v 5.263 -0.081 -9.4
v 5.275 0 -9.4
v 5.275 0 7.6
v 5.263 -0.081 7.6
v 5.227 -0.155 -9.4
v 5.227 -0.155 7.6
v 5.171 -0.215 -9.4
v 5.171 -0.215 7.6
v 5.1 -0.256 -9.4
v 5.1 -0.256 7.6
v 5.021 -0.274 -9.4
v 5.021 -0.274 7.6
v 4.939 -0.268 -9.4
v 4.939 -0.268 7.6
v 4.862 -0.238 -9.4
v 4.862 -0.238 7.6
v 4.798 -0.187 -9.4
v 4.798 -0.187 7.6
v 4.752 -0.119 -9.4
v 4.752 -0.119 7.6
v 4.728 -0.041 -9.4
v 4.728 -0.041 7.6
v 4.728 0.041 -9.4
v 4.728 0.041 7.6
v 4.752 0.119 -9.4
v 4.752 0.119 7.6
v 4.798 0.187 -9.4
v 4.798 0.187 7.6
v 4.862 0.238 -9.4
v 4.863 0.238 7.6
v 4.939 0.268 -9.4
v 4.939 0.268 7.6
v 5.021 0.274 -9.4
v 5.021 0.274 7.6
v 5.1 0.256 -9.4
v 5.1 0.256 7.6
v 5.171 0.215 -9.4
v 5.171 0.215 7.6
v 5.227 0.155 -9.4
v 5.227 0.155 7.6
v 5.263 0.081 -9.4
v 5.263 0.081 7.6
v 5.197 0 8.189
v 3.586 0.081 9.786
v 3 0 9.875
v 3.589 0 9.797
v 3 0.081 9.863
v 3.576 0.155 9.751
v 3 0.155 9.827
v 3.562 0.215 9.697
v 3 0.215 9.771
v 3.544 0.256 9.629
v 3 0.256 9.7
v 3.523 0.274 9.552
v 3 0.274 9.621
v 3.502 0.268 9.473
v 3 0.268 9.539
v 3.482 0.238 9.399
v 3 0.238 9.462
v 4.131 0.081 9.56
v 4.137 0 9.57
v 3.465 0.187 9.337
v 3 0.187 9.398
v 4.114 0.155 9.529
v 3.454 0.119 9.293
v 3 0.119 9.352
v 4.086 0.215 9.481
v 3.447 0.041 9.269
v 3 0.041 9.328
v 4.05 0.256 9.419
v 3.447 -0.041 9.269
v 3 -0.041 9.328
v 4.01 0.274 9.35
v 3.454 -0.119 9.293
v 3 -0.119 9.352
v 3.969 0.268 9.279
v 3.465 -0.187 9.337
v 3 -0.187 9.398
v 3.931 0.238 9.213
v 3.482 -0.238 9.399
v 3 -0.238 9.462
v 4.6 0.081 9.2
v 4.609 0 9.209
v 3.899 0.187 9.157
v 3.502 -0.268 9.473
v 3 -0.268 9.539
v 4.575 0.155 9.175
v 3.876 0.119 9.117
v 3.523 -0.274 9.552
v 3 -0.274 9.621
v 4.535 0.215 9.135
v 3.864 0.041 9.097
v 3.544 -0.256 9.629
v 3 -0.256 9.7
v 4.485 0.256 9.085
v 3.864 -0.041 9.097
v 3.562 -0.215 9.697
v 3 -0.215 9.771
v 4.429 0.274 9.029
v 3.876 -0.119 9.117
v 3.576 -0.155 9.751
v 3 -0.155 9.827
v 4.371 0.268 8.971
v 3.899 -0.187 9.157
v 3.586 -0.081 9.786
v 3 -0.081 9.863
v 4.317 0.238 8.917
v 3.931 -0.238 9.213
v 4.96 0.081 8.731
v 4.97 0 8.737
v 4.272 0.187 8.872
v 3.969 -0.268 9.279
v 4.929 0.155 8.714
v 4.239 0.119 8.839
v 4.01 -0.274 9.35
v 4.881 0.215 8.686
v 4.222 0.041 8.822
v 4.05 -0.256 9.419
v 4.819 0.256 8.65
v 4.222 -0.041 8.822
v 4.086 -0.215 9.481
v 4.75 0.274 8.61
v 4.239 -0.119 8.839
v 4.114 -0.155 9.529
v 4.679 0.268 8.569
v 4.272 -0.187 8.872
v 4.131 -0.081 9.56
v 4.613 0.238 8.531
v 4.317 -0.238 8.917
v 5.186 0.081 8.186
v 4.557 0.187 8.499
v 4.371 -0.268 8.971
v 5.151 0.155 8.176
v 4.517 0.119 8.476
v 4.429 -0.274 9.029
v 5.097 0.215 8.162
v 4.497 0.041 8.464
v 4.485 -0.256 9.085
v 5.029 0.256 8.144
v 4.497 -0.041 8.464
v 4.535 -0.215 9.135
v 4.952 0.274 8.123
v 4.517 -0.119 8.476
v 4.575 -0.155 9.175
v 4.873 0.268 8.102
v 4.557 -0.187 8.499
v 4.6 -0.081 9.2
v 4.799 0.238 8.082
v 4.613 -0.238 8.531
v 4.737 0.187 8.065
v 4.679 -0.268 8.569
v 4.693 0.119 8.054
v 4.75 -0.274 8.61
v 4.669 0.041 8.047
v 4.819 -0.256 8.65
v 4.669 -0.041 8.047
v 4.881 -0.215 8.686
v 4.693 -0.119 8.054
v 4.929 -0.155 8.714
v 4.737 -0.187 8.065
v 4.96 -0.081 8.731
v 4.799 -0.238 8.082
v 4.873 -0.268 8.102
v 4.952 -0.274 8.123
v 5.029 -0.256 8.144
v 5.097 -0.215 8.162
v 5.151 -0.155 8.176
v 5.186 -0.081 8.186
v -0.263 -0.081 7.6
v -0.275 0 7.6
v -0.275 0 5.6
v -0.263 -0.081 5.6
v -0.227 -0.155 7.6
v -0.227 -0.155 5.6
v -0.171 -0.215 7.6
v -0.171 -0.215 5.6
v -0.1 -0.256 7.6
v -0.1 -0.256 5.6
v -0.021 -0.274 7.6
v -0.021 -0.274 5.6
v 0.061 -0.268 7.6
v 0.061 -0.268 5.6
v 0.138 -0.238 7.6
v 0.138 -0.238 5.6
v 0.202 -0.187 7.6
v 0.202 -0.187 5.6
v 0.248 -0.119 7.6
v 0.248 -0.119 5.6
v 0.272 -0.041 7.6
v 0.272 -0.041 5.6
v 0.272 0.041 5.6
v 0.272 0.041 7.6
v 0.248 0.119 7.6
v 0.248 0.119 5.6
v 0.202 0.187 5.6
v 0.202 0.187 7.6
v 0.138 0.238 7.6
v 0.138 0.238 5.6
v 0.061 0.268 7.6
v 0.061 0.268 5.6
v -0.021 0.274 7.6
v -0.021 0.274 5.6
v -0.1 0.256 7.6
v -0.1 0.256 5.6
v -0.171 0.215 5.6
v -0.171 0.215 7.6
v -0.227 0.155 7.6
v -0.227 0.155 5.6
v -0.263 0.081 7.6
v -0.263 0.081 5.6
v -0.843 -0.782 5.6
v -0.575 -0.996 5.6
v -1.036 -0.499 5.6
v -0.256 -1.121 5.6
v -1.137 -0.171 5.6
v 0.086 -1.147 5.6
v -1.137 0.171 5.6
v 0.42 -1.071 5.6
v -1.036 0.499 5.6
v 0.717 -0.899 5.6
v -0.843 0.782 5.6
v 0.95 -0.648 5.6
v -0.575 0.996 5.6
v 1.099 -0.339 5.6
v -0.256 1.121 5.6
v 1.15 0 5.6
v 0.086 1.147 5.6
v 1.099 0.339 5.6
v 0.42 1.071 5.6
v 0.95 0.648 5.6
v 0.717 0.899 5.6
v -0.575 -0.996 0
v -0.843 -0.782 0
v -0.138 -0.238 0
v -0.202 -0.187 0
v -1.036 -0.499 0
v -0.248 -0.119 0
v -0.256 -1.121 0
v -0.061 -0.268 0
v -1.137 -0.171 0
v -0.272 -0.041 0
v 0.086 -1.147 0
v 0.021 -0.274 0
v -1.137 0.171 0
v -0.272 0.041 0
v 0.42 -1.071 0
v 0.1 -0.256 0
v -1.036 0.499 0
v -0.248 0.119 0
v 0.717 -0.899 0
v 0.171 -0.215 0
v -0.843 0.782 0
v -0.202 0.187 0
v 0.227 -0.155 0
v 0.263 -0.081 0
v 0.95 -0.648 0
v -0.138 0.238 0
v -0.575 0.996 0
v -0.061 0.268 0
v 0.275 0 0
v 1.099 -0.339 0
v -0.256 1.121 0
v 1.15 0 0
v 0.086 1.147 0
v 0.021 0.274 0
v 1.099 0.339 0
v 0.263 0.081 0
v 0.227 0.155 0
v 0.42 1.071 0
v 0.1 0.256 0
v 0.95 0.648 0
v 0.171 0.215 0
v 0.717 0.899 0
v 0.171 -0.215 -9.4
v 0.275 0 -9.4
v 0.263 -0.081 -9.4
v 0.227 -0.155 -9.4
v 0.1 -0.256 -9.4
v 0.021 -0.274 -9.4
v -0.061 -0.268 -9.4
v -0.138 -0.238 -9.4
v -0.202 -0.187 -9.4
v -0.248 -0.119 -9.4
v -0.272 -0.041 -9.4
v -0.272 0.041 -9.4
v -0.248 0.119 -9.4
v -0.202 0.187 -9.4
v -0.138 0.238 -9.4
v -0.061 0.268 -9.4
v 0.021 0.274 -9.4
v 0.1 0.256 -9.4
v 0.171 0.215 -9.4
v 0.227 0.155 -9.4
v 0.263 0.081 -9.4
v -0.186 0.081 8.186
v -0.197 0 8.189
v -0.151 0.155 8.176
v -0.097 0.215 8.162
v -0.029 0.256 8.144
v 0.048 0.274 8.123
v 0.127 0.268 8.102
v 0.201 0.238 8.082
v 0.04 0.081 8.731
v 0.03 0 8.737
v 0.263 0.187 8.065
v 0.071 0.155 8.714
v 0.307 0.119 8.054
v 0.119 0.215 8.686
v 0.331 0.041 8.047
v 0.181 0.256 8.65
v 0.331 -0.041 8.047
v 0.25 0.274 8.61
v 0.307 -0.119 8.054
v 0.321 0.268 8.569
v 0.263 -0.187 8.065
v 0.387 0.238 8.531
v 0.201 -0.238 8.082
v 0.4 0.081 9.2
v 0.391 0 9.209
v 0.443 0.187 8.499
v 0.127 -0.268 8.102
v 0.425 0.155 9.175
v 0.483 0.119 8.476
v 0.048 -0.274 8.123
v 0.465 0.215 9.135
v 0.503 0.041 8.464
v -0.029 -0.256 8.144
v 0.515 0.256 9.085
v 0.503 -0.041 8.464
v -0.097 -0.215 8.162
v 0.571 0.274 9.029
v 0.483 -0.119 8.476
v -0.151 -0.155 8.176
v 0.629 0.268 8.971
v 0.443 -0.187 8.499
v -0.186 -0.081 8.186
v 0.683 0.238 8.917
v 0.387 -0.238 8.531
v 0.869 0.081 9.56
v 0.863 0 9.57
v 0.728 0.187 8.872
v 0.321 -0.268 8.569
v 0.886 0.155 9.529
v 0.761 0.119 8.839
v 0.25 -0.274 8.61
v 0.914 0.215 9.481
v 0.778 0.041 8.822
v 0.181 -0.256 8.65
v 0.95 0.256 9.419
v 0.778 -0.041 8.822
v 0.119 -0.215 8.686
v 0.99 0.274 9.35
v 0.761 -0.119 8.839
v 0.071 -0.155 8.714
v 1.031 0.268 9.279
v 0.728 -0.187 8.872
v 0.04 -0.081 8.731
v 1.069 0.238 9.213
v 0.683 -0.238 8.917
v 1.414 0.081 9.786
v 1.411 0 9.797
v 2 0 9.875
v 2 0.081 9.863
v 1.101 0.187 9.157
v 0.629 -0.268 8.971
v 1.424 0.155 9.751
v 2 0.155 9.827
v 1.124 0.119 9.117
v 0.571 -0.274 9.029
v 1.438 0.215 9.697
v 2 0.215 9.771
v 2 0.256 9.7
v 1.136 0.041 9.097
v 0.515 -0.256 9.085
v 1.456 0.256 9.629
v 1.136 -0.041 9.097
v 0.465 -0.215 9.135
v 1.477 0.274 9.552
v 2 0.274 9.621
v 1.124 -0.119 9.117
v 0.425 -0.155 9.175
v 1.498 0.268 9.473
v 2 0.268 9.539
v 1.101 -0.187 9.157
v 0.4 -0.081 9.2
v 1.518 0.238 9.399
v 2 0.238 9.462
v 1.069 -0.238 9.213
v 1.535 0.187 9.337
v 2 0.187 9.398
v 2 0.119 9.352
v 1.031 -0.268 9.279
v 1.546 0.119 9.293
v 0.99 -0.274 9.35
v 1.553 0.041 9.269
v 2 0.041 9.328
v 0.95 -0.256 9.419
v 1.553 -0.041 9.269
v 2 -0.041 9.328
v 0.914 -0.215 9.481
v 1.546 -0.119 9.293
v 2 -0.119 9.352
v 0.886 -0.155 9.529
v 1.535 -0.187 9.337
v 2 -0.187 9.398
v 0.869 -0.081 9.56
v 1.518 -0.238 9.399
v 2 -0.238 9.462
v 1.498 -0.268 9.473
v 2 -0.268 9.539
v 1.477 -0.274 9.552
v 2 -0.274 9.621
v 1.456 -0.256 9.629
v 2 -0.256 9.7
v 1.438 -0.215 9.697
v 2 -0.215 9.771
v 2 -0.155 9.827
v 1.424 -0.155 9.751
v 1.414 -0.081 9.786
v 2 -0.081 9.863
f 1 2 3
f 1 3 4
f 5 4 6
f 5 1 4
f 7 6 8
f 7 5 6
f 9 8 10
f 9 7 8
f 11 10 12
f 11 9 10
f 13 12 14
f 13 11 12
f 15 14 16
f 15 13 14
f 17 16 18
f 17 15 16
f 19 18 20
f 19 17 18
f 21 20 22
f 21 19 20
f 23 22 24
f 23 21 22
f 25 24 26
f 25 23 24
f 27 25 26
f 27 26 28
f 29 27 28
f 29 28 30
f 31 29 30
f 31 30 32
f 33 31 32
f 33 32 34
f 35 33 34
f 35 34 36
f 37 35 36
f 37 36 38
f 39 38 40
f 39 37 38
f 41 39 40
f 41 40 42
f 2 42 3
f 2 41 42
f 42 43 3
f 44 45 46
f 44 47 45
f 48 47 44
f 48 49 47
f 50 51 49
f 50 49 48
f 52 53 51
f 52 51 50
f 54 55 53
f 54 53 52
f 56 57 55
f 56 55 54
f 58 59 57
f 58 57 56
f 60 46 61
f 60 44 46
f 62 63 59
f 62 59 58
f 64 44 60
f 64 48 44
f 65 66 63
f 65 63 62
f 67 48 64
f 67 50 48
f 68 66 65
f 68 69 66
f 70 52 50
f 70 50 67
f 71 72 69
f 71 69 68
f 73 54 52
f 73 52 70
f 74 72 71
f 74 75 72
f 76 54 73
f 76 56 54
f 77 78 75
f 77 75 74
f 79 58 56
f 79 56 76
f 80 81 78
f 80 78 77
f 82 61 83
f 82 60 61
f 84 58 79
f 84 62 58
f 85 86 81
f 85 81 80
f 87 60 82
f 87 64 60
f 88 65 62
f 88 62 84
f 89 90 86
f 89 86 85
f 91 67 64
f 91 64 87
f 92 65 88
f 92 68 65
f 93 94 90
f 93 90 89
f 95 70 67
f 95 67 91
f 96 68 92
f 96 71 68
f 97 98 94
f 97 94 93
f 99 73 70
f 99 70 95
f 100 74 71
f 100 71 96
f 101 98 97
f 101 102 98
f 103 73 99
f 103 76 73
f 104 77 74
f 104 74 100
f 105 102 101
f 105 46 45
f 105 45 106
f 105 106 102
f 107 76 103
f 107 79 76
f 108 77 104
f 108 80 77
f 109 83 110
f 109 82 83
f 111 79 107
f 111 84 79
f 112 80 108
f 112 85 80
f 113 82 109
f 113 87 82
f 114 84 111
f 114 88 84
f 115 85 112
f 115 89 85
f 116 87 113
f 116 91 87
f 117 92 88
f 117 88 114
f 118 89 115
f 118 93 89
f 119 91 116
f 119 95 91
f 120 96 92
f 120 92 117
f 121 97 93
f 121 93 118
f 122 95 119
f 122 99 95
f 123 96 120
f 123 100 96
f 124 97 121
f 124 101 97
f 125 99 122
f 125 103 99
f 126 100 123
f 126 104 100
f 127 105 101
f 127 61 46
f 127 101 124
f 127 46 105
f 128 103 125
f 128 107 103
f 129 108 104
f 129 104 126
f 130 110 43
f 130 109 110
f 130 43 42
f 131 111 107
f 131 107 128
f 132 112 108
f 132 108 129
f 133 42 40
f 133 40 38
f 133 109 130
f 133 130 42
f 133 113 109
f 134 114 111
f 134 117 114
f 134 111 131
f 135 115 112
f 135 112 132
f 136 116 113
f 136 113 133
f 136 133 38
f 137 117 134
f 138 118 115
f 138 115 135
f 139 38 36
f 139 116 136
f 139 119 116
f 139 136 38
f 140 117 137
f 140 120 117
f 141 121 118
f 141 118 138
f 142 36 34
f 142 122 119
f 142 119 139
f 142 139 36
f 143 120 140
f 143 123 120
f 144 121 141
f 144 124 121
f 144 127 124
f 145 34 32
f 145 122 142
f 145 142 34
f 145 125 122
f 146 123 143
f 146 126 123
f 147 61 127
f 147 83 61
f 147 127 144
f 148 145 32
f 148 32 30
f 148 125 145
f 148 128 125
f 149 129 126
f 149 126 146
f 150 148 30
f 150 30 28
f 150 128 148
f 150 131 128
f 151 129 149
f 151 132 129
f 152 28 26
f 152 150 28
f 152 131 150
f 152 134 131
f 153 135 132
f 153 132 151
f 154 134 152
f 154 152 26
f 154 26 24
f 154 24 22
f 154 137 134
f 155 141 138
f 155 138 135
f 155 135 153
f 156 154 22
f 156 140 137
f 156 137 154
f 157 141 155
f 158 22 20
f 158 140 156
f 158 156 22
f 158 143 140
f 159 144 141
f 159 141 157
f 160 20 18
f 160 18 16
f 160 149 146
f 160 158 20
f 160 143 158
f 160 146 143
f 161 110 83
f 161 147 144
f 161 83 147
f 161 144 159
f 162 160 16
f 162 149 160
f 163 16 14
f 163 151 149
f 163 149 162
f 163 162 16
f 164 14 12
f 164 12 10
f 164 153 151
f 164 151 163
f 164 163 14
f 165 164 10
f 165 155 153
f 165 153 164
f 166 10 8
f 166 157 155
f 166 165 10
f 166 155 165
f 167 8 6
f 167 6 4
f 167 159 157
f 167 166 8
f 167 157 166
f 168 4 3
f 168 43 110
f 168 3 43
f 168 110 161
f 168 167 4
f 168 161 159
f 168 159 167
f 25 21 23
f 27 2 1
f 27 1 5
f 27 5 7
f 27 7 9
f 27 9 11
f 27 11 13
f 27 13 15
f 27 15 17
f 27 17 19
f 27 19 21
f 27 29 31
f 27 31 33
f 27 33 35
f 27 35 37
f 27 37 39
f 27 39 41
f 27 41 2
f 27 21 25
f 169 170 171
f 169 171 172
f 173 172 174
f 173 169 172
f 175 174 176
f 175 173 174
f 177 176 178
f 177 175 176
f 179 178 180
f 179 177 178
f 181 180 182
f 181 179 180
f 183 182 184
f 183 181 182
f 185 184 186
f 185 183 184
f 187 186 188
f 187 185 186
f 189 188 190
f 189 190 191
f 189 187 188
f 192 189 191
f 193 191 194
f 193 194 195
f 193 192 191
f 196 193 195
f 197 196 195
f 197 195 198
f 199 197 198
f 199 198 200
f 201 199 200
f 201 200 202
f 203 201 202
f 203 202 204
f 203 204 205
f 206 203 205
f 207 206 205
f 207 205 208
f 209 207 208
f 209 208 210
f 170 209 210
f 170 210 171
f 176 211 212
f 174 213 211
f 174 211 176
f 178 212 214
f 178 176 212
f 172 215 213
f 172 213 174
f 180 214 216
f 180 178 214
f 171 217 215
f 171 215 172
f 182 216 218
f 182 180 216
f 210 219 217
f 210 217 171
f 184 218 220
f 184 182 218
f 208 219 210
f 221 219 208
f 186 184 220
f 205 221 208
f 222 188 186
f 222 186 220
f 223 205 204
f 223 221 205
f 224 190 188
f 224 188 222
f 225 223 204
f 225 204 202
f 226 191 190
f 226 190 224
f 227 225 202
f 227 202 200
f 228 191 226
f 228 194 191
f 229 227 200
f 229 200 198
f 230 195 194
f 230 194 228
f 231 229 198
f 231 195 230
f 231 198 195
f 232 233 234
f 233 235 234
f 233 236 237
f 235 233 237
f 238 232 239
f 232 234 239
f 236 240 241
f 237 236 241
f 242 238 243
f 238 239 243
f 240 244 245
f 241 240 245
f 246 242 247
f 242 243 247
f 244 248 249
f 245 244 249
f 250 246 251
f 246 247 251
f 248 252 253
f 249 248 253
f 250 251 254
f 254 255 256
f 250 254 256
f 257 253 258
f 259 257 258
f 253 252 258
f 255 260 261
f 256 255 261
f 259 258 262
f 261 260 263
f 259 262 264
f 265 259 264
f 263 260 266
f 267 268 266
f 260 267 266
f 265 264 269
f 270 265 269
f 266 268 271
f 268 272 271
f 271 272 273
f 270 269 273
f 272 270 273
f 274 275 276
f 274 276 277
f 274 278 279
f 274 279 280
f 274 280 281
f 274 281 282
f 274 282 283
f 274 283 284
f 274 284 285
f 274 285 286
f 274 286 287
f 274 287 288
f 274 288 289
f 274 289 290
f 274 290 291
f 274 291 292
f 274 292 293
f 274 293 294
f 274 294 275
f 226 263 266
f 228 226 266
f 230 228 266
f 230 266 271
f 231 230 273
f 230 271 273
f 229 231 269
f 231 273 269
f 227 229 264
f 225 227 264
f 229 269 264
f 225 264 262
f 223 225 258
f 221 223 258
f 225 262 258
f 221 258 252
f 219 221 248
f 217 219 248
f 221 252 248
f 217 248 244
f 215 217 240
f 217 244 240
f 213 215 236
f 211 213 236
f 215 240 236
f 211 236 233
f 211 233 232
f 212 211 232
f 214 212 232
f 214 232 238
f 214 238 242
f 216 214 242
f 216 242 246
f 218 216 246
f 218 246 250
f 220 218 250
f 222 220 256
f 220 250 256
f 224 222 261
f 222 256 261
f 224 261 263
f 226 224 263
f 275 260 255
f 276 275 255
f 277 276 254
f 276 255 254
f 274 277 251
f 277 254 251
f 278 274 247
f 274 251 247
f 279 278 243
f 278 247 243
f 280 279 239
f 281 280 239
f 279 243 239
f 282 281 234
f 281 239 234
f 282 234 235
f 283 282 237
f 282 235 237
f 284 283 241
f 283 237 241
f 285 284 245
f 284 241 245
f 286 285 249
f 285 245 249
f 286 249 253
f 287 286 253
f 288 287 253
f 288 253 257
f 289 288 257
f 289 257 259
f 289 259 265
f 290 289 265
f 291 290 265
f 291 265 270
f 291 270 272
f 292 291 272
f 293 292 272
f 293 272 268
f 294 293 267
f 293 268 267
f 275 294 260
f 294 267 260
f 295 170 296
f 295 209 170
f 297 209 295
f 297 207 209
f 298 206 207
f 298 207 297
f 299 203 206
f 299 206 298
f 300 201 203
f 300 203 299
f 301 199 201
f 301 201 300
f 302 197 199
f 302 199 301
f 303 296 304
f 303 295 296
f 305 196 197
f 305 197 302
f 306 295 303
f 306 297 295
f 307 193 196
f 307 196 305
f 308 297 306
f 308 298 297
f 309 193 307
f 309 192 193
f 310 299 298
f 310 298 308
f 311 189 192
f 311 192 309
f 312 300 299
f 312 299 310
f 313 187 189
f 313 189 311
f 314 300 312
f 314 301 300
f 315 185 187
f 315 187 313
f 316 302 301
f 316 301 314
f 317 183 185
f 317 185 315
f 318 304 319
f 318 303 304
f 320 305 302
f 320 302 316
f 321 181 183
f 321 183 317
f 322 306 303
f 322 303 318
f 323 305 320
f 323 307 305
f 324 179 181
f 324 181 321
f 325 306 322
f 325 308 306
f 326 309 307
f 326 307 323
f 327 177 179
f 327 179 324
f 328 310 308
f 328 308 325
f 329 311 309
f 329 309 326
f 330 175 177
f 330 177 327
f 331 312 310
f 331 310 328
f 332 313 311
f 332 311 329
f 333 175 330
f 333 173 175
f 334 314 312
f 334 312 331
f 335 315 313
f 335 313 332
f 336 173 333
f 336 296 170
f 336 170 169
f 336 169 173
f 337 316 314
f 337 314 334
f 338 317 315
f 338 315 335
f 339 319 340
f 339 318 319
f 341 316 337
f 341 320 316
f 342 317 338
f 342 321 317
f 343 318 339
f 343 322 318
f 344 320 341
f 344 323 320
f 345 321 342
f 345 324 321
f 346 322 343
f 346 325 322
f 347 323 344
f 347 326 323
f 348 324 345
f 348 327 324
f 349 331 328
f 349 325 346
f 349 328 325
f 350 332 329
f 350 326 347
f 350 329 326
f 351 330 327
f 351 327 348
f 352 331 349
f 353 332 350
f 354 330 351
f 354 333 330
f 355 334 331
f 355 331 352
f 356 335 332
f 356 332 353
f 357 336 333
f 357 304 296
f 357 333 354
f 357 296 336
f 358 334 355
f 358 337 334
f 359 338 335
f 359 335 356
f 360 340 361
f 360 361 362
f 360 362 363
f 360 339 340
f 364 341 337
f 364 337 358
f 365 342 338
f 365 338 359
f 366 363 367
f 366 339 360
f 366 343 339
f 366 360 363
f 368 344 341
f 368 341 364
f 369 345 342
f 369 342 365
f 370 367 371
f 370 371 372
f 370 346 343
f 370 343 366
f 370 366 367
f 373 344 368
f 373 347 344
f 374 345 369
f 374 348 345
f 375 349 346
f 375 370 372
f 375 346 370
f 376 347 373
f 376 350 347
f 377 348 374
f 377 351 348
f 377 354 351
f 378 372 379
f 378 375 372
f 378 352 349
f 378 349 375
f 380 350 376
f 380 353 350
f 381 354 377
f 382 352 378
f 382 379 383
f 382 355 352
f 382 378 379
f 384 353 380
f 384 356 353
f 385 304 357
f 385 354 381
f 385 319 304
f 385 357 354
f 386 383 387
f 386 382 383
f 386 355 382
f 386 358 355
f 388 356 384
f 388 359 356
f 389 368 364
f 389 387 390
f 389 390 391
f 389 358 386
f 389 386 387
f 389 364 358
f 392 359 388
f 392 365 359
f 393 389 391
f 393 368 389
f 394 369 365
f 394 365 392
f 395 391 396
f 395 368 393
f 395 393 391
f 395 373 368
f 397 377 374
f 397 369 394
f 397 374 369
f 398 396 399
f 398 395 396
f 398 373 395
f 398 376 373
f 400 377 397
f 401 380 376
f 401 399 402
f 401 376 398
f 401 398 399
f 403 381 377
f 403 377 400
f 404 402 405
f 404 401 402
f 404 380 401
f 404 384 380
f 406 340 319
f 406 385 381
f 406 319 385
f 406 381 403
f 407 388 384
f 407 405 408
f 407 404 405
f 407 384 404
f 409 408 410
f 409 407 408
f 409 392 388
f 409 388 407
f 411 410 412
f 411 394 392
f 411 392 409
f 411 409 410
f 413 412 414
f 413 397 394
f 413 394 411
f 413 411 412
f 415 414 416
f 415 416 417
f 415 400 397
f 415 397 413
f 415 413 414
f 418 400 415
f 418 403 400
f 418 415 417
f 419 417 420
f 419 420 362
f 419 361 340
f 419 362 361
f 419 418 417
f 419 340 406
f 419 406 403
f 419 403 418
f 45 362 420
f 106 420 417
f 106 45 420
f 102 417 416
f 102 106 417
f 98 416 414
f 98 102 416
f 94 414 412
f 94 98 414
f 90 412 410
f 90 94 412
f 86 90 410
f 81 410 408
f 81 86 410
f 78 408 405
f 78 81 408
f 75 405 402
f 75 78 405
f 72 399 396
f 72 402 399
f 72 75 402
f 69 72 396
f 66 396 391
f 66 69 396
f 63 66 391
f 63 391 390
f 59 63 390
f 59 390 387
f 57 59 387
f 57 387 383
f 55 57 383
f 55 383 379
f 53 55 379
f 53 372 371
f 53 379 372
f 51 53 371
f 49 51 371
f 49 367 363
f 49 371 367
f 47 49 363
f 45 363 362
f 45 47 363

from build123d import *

# Parameters (mm, degrees)
SKETCH2_R           = 1.15
RESISTOR_BODY_DEPTH = 5.6
LEAD1_PROFILE_R     = 0.275
SKETCH6_R           = 0.275
LEAD2_DEPTH         = 9.4


with BuildPart() as part:
    # Sketch2 → Resistor Body (new body)
    with BuildSketch(Plane.XY):
        Circle(SKETCH2_R)
    extrude(amount=RESISTOR_BODY_DEPTH)

    # Lead1: sweep along a path in Lead1 Path
    with BuildLine(Plane(origin=(0, 0, 0), x_dir=(1, 0, 0), z_dir=(0, 1, 0))) as lead1_path:
        Line((0, -5.6), (0, -7.6))
        ThreePointArc((0, -7.6), (0.585786438, -9.014213562), (2, -9.6))
        Line((2, -9.6), (3, -9.6))
        ThreePointArc((3, -9.6), (4.414213562, -9.014213562), (5, -7.6))
        Line((5, -7.6), (5, 9.4))
    # Lead1 Profile → Lead1 (sweep)
    with BuildSketch(Plane(origin=(0, 0, 5.6), x_dir=(-1, 0, 0), z_dir=(0, 0, 1))):
        Circle(LEAD1_PROFILE_R)
    sweep(path=lead1_path.line)

    # Sketch6 → Lead2 (add)
    with BuildSketch(Plane(origin=(0, 0, 0), x_dir=(1, 0, 0), z_dir=(0, 0, -1))):
        Circle(SKETCH6_R)
    extrude(amount=LEAD2_DEPTH)


solid = part.part
